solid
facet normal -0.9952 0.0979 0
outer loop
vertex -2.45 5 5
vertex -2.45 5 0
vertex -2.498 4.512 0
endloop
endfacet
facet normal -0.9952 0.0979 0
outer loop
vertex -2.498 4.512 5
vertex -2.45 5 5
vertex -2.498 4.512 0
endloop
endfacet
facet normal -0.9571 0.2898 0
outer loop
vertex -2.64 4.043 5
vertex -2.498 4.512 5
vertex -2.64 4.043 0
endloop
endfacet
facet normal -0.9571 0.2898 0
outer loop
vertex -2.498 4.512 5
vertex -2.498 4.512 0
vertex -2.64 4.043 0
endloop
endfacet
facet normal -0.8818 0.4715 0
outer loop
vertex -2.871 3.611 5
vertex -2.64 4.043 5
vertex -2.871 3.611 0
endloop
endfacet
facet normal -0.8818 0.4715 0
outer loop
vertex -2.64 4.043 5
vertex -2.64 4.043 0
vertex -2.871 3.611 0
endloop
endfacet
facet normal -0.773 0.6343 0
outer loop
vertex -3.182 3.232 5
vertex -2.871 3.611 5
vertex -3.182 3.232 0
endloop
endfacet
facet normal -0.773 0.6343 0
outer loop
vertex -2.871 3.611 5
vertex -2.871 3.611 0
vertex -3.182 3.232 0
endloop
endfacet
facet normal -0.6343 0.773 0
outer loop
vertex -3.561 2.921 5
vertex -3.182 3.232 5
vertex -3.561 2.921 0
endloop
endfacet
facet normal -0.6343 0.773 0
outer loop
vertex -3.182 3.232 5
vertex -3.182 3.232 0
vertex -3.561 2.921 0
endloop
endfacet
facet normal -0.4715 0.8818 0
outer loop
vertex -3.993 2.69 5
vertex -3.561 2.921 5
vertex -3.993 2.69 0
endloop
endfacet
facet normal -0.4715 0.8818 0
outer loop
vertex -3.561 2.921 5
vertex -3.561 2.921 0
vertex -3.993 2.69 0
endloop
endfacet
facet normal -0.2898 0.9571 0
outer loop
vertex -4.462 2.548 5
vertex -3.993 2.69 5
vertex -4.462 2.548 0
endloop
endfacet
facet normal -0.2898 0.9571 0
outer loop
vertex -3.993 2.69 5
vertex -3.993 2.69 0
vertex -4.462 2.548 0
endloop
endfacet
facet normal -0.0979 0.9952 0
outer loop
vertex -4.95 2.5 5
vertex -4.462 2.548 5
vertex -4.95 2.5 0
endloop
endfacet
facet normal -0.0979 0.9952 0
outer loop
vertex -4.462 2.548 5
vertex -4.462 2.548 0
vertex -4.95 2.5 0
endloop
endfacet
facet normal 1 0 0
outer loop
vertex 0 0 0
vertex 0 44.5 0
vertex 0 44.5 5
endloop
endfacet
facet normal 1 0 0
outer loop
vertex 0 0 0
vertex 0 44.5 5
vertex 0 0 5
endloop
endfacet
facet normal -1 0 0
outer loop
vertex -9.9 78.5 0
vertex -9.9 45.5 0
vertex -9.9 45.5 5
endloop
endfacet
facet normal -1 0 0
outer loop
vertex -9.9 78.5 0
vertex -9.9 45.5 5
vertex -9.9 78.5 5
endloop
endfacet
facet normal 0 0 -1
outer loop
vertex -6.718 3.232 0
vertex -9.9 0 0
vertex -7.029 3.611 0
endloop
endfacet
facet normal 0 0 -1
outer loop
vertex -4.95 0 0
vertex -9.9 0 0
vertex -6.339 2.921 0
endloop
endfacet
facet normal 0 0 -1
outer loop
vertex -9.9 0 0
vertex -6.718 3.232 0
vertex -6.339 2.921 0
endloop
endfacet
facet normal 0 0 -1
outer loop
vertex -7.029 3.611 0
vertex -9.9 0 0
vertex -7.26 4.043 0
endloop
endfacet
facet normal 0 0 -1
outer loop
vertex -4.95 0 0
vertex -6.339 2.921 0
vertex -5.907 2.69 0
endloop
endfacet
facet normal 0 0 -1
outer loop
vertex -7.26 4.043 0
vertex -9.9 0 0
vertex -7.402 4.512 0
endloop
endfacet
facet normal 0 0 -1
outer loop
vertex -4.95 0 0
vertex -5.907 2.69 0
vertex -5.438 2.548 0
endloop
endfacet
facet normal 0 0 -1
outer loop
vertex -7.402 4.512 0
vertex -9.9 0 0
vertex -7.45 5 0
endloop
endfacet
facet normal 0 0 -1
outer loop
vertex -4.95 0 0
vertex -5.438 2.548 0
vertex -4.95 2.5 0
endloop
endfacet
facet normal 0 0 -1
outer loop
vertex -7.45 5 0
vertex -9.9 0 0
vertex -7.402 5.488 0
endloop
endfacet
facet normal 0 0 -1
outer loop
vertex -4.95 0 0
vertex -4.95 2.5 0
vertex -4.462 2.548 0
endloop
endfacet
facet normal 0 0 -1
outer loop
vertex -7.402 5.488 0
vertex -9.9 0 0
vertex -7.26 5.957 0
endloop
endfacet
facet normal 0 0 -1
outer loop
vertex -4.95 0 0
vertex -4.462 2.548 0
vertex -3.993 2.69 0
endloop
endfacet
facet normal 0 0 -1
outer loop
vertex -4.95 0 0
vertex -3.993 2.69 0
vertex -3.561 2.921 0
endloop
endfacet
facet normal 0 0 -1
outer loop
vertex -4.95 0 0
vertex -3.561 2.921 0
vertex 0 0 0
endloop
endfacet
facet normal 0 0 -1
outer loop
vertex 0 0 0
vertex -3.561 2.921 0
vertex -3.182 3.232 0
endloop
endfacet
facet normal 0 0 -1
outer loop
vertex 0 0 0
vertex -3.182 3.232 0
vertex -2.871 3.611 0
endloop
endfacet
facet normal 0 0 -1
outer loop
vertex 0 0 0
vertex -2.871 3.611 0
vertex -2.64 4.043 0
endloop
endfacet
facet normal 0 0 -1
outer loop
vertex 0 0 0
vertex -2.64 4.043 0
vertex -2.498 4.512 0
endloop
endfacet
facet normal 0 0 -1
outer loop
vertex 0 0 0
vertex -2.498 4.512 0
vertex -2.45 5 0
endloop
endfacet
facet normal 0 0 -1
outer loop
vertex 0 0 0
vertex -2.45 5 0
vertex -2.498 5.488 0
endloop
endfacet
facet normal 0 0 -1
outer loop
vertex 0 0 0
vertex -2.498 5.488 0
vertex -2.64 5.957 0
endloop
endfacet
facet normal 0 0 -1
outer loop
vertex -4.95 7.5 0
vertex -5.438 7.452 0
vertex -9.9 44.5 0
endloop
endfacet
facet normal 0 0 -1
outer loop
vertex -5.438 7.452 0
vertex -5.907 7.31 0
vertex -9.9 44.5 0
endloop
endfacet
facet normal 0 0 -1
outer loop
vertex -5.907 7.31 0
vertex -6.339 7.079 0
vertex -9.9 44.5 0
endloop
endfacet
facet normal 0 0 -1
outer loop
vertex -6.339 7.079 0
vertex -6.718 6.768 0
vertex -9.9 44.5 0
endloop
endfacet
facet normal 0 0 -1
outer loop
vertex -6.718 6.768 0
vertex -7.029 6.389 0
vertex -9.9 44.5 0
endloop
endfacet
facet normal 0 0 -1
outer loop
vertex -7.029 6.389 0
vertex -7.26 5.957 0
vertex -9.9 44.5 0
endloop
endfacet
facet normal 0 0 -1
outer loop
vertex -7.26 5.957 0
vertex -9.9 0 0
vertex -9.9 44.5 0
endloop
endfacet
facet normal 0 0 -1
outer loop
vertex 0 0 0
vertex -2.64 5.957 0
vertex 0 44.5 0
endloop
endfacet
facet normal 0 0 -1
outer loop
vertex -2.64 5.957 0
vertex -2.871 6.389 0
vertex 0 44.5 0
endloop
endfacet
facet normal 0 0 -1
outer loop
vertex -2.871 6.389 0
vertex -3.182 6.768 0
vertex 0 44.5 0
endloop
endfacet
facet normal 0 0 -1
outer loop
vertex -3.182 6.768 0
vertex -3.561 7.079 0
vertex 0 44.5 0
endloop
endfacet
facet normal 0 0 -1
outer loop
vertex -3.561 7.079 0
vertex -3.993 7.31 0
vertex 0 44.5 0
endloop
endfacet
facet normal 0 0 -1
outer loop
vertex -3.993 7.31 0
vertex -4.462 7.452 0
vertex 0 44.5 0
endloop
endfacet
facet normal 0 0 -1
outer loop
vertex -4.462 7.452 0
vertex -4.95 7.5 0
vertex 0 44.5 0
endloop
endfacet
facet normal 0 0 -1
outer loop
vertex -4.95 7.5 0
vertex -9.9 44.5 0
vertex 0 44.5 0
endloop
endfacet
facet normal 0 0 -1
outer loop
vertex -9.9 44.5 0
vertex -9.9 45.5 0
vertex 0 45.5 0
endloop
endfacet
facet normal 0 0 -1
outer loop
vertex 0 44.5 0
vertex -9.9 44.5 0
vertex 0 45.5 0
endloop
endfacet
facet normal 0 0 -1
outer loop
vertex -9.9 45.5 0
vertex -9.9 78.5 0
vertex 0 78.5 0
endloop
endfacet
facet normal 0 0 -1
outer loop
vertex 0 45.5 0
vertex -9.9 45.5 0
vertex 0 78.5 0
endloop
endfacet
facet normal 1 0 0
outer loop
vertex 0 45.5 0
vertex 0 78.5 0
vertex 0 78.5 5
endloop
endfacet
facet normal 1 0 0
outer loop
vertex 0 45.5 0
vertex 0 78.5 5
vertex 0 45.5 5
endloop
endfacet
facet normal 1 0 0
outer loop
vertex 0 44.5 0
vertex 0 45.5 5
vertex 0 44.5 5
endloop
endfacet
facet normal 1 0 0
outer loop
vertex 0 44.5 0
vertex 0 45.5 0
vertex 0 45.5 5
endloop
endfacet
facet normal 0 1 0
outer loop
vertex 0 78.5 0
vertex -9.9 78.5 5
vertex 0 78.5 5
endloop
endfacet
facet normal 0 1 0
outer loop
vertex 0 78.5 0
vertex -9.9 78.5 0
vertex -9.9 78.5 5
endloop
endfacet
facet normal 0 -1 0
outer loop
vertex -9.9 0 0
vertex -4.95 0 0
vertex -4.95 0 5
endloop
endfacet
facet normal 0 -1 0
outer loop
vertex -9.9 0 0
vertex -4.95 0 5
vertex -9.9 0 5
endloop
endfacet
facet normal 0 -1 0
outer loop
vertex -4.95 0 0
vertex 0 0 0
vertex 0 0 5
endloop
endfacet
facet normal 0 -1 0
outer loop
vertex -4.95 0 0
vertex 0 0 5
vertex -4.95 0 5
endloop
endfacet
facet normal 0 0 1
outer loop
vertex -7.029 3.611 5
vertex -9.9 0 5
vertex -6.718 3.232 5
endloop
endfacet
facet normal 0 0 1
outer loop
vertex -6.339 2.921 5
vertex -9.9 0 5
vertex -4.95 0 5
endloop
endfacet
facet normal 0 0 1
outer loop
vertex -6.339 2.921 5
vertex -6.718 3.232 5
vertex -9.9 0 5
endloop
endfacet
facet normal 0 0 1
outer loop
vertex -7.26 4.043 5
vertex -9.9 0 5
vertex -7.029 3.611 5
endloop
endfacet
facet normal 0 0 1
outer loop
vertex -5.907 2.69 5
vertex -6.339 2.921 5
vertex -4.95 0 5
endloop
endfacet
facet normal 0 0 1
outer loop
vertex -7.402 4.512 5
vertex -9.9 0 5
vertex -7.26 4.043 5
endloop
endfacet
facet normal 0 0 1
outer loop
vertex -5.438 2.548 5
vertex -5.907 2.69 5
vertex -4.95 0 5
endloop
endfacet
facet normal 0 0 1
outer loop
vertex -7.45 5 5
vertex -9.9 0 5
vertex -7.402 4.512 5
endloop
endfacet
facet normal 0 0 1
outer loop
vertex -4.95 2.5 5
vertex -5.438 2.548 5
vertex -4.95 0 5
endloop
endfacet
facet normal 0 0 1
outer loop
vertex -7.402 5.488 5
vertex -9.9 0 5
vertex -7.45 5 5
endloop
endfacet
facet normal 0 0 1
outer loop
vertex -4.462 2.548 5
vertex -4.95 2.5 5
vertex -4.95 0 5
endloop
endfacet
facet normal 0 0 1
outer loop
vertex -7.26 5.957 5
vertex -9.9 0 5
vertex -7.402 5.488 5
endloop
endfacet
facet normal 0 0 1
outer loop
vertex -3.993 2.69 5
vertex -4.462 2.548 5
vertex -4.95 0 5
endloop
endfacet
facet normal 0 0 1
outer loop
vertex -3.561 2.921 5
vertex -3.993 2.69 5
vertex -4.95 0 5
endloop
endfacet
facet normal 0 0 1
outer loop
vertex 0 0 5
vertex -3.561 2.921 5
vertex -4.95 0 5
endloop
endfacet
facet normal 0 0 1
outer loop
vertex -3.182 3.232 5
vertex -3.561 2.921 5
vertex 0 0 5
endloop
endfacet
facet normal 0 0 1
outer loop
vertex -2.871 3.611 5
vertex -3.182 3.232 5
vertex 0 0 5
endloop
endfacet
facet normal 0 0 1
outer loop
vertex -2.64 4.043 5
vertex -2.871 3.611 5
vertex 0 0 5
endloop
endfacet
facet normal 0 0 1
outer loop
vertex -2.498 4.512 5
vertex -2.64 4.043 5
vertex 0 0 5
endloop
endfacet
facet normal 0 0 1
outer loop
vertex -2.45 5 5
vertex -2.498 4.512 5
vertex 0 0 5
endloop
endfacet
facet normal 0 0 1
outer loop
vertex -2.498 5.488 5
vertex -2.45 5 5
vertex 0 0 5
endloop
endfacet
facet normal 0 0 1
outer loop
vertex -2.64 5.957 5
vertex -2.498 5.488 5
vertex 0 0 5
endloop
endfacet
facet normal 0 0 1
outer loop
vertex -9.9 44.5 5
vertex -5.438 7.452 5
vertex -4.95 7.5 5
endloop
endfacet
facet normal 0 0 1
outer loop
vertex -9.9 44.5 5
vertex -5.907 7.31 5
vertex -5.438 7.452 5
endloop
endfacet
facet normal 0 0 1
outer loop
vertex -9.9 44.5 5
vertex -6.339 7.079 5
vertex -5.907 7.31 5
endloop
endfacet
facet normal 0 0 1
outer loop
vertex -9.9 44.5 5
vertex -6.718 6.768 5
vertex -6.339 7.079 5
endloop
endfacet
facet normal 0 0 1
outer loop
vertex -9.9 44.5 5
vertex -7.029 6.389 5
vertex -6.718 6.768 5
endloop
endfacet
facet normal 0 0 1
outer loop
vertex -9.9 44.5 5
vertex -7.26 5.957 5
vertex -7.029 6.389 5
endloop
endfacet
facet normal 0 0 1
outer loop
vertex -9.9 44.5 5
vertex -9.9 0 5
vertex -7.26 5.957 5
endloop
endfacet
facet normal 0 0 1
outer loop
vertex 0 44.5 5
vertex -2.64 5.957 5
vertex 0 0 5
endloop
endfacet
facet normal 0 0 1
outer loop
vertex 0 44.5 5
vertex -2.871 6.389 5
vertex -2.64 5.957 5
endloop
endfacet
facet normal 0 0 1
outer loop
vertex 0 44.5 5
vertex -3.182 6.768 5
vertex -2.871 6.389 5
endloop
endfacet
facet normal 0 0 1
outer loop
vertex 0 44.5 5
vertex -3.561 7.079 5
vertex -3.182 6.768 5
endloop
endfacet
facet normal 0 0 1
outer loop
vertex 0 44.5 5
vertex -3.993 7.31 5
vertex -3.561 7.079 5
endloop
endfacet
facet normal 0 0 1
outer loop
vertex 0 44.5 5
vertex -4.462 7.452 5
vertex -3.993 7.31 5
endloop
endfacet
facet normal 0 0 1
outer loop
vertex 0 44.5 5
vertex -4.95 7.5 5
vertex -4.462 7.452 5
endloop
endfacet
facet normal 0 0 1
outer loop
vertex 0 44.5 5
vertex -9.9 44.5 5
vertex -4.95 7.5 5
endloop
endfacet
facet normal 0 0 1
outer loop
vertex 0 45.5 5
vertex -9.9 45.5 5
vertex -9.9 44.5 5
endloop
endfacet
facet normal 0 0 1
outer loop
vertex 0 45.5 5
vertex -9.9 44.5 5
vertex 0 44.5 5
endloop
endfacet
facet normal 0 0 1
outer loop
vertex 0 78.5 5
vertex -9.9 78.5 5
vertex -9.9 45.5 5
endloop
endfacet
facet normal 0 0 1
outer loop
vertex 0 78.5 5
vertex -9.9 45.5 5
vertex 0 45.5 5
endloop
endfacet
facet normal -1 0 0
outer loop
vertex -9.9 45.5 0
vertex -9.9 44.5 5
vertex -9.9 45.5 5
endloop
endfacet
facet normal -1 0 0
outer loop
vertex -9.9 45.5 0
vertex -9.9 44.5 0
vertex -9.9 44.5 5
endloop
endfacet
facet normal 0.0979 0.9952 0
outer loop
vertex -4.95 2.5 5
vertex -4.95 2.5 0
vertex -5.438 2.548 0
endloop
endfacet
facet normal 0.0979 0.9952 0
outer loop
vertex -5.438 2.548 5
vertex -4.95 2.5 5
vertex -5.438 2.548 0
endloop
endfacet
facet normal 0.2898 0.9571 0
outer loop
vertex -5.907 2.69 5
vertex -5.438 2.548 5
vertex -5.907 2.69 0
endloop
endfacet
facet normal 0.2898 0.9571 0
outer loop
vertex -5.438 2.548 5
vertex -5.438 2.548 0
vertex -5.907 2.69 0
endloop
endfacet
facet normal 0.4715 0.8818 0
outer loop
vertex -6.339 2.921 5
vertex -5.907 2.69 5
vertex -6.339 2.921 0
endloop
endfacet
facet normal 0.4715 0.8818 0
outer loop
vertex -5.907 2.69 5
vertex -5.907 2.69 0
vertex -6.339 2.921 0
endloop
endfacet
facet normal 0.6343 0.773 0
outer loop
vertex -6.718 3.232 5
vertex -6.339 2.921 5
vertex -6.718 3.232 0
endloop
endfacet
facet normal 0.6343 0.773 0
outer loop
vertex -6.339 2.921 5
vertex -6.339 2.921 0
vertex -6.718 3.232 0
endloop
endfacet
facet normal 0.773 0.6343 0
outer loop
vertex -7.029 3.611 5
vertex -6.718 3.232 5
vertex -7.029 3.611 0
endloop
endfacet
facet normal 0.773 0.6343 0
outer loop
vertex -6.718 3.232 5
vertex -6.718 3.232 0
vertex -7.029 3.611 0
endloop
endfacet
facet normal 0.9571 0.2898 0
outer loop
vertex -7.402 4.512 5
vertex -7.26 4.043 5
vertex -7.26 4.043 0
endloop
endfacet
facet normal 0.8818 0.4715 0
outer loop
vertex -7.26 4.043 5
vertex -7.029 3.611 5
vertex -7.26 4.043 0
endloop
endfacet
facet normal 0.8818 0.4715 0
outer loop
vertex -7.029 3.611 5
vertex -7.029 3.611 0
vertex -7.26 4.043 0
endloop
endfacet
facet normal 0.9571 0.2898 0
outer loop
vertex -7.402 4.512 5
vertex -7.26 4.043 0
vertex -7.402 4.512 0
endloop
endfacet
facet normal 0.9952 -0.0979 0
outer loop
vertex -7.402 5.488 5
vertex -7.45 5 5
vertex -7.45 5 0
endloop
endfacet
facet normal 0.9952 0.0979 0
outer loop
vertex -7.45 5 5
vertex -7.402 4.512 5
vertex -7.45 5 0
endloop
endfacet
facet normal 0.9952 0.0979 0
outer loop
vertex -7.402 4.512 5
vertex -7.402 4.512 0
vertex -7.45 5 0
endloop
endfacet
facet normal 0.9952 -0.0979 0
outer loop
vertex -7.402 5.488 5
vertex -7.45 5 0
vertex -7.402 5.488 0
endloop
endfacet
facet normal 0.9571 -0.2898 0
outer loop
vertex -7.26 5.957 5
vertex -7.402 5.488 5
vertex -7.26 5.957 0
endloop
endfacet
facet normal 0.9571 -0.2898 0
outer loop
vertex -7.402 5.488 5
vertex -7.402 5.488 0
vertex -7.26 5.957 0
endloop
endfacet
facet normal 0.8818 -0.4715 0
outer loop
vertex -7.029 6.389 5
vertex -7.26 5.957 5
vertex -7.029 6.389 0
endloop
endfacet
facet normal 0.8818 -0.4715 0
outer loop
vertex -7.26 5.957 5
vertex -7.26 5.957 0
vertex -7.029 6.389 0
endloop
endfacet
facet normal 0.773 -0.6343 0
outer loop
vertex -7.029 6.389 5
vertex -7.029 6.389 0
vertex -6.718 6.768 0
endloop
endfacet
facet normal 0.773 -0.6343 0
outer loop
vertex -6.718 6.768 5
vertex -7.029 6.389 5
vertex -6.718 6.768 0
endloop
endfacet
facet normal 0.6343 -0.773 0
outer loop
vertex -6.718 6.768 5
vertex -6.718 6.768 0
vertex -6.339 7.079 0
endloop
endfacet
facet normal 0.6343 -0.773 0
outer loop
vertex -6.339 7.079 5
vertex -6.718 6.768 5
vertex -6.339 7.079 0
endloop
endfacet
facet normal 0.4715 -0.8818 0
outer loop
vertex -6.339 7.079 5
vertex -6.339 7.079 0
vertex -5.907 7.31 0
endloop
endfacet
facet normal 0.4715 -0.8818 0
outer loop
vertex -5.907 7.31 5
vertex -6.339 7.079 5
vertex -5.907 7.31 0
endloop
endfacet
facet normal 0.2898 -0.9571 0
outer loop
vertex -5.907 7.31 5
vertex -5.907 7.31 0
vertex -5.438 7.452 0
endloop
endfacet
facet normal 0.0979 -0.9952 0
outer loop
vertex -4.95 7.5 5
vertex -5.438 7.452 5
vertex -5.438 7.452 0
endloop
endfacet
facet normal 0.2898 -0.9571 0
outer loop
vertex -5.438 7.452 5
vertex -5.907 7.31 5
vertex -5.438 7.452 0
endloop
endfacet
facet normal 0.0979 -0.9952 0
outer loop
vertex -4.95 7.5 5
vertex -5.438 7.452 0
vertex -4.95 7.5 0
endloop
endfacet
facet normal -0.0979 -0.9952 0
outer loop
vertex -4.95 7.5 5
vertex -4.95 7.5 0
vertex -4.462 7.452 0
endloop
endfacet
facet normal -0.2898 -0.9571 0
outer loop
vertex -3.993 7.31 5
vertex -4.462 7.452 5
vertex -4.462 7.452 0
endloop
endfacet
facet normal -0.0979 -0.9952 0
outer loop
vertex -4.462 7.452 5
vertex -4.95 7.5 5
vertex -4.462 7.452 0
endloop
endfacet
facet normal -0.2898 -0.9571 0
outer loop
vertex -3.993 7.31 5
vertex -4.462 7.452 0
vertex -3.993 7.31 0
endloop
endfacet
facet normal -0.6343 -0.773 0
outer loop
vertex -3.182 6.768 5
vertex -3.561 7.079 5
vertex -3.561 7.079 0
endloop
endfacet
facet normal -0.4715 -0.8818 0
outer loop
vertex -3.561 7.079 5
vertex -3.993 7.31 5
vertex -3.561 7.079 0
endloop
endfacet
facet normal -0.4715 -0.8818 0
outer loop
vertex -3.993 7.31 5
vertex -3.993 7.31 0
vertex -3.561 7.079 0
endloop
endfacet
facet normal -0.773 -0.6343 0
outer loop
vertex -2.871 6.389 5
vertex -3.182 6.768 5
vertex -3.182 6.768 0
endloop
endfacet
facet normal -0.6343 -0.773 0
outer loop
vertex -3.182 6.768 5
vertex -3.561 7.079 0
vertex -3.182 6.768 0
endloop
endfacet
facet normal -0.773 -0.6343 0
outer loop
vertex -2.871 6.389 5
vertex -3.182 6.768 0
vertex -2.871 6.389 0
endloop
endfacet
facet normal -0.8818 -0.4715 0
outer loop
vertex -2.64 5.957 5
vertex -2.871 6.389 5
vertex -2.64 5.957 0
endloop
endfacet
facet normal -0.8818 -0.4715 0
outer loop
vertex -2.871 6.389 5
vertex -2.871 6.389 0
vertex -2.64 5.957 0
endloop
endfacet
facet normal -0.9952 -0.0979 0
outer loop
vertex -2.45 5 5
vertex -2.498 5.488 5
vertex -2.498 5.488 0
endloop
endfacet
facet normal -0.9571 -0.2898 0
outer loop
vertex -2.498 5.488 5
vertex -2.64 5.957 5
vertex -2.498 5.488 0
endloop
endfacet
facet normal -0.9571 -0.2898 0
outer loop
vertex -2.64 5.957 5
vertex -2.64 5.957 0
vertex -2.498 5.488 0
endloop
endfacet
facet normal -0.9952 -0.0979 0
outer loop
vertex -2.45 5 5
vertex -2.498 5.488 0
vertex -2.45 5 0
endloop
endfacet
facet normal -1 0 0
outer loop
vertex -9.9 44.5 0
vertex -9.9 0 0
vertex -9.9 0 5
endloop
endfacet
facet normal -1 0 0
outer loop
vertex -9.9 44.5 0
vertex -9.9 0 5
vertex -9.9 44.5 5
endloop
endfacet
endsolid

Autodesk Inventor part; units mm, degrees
ref_plane "YZ Plane" through (0, 0, 0) normal (1, 0, 0) x (0, 1, 0)
ref_plane "XZ Plane" through (0, 0, 0) normal (0, 1, 0) x (-1, 0, 0)
ref_plane "XY Plane" through (0, 0, 0) normal (0, 0, 1) x (1, 0, 0)
sketch "Sketch2" plane through (0, 0, 0) normal (0, 0, 1) x (1, 0, 0)
  line L0 (0, 0) -> (-9.9, 0)
  line L1 (-9.9, 0) -> (-9.9, 105)
  line L2 (-9.9, 105) -> (0, 105)
  line L3 (0, 105) -> (0, 0)
  line L4 (-4.95, 0) -> (-4.95, 2.5)
  line L5 (-4.95, 0) -> (-2.45, 0) construction
  circle A0 centre (-4.95, 5) radius 2.5
  line L6 (-4.95, 7.5) -> (32.05, 7.5) construction
  line L7 (0, 44.5) -> (0, 0)
  line L8 (0, 0) -> (-9.9, 0)
  line L9 (-9.9, 0) -> (-9.9, 44.5)
  line L10 (0, 45.5) -> (0, 0)
  line L11 (0, 0) -> (-9.9, 0)
  line L12 (-9.9, 0) -> (-9.9, 45.5)
  line L13 (-4.95, 7.5) -> (66.05, 7.5) construction
  line L14 (-9.9, 78.5) -> (0, 78.5)
  dimension "d35" = 5
  dimension "d4" = 9.9
  dimension "d5" = 105
  dimension "d33" = 2.5
  dimension "d34" = 90
extrude "Extrusion5" add sketch "Sketch2" along normal blind 5 contours L0 L1 L14 L3
properties part number "Elbow_Cube_Holder_TestFit_V2"
